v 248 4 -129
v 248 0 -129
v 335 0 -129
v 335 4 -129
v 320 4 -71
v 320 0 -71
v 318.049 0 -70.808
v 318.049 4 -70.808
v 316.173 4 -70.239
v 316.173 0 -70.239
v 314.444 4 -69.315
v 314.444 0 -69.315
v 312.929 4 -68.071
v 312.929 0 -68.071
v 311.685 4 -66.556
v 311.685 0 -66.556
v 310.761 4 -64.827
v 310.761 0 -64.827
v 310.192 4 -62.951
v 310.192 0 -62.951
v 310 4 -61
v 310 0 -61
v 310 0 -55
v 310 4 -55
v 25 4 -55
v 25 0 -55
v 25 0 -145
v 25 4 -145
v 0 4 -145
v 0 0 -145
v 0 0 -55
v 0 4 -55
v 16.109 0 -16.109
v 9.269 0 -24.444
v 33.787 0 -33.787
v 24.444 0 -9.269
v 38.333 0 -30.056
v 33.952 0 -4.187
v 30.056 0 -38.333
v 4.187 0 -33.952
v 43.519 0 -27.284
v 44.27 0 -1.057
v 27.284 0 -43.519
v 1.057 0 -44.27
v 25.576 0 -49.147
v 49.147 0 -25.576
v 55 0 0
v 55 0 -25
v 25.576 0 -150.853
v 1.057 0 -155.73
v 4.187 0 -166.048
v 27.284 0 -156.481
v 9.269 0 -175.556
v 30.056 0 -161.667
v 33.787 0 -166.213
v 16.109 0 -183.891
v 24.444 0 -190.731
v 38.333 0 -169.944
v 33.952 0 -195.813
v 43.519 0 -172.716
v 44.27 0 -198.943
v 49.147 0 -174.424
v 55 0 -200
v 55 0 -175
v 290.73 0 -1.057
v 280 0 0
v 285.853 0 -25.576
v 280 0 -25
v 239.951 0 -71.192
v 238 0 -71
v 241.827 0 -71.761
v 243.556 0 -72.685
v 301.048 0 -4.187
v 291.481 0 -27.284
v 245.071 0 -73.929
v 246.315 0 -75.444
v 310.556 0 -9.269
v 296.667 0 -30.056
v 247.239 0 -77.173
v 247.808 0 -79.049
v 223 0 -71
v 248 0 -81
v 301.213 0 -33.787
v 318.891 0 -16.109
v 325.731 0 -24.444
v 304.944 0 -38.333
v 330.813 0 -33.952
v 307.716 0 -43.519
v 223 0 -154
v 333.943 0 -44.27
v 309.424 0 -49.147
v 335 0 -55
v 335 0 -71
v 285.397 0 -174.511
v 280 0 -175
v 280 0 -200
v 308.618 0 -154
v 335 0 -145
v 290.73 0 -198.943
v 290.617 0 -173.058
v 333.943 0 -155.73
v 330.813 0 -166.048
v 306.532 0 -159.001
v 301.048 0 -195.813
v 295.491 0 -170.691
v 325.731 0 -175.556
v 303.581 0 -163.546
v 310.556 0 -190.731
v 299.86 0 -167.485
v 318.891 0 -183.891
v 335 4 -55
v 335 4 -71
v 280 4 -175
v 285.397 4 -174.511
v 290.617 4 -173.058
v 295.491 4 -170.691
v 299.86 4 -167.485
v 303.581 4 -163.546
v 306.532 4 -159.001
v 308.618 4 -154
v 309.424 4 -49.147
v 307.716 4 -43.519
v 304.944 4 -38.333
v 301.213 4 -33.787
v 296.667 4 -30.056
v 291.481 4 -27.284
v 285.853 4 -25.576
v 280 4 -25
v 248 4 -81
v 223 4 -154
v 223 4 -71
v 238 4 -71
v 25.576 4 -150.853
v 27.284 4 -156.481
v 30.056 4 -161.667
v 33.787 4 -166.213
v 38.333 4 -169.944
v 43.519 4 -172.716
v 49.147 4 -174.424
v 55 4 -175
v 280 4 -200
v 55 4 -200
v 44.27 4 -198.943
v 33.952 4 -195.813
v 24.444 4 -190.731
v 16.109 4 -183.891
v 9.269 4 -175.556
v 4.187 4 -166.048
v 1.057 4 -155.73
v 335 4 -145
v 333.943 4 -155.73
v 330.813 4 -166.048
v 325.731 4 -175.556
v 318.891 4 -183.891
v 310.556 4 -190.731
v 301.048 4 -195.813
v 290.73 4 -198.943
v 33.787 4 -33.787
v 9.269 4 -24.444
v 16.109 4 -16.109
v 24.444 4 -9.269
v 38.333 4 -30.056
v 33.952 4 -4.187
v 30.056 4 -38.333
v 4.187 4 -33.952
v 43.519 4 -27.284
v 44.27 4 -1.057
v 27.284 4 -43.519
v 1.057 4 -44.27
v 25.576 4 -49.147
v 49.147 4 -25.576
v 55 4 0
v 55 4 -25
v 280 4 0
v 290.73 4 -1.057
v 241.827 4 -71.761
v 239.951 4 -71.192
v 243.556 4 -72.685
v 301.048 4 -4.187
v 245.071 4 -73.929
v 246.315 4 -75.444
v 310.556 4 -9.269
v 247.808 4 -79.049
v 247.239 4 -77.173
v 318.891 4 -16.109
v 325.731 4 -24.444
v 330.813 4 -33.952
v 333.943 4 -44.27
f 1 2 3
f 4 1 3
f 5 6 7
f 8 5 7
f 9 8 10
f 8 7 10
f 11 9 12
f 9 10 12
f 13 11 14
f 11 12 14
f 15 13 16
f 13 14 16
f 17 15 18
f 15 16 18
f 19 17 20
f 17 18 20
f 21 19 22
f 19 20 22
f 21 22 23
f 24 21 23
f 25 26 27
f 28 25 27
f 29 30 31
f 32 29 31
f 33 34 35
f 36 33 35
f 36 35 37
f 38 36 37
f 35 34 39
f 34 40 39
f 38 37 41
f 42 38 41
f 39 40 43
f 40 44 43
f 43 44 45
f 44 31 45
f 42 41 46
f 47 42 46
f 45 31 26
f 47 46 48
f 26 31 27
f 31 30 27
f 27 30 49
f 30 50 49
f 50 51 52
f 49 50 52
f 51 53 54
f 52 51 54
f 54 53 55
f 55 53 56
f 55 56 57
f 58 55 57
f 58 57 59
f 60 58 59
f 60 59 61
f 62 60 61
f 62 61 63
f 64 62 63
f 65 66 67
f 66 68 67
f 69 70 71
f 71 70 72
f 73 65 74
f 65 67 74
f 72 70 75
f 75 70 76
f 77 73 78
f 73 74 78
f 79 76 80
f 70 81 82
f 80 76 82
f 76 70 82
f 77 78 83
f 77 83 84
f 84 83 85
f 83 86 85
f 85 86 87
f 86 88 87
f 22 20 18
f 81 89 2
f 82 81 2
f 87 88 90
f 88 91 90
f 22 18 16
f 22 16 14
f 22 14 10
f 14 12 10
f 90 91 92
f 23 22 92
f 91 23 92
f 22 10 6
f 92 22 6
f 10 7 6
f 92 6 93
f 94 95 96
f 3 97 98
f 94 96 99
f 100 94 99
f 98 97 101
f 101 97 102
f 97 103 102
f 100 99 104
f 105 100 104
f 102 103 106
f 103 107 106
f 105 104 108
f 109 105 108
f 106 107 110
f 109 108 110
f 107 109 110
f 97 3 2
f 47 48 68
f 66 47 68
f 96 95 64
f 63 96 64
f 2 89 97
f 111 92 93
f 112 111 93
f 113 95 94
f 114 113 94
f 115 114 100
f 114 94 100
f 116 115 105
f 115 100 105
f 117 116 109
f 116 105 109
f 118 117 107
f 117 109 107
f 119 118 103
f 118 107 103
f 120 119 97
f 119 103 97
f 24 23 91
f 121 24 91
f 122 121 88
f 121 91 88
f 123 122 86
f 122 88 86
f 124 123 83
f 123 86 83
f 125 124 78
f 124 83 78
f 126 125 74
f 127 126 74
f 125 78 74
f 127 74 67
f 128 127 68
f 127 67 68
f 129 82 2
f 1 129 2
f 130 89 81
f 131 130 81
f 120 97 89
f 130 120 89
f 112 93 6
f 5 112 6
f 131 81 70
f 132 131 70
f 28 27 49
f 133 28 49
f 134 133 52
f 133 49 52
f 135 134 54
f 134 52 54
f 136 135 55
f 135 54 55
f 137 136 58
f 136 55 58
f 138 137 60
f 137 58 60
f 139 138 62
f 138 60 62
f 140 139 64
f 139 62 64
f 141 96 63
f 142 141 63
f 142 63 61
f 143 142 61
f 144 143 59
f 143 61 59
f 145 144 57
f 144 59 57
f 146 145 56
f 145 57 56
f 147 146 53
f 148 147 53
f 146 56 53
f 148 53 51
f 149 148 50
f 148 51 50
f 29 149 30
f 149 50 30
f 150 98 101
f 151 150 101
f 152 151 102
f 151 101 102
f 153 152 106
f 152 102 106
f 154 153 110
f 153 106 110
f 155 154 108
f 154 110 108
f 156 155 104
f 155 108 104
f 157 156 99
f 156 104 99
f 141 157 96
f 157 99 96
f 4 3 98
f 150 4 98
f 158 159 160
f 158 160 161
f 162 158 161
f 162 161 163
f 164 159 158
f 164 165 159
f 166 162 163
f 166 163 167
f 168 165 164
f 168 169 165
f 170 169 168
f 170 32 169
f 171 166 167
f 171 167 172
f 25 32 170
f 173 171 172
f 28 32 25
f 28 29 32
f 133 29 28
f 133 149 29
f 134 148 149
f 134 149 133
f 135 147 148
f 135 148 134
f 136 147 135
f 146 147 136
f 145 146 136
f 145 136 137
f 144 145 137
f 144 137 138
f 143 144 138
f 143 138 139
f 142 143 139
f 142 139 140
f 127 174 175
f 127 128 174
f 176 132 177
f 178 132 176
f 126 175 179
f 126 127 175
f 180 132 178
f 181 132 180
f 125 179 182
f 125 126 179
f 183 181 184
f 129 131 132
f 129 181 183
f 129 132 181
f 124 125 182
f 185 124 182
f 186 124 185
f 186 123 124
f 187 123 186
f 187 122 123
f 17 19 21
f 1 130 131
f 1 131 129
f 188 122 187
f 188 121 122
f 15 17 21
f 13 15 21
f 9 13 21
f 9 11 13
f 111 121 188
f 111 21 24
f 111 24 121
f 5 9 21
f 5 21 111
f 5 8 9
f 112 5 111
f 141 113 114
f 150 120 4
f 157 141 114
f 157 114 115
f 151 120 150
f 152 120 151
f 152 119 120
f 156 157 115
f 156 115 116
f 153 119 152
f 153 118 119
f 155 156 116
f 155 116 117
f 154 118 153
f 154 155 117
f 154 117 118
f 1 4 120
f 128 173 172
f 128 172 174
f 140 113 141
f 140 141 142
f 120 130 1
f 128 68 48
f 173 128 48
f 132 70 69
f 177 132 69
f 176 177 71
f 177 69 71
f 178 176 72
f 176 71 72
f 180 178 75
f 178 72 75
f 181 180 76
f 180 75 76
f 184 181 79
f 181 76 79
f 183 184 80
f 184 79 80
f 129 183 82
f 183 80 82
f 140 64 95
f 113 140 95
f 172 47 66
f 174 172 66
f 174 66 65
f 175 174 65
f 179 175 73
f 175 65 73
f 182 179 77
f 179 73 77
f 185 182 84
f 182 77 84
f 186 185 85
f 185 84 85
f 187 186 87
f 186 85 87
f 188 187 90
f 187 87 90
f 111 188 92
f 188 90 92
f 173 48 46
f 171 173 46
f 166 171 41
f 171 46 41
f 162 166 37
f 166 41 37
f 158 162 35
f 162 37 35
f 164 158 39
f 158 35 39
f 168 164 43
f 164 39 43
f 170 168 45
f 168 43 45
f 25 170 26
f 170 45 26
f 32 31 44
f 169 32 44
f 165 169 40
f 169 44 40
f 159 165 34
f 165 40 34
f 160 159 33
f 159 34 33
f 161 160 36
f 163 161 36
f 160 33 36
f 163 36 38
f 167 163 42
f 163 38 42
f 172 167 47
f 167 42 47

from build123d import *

# Parameters (mm, degrees)
BOSS_EXTRUDE1_DEPTH = 4


with BuildPart() as part:
    # Sketch1 → Boss-Extrude1 (new body)
    with BuildSketch(Plane(origin=(0, 0, 0), x_dir=(1, 0, 0), z_dir=(0, 1, 0))):
        with BuildLine():
            Line((223, 154), (223, 71))
            Line((223, 71), (238, 71))
            ThreePointArc((238, 71), (245.071067812, 73.928932188), (248, 81))
            Line((248, 81), (248, 129))
            Line((248, 129), (335, 129))
            Line((335, 129), (335, 145))
            ThreePointArc((335, 145), (318.890872965, 183.890872965), (280, 200))
            Line((280, 200), (55, 200))
            ThreePointArc((55, 200), (16.109127035, 183.890872965), (0, 145))
            Line((0, 145), (0, 55))
            ThreePointArc((0, 55), (16.109127035, 16.109127035), (55, 0))
            Line((55, 0), (280, 0))
            ThreePointArc((280, 0), (318.890872965, 16.109127035), (335, 55))
            Line((335, 55), (335, 71))
            Line((335, 71), (320, 71))
            ThreePointArc((320, 71), (312.928932188, 68.071067812), (310, 61))
            Line((310, 61), (310, 55))
            ThreePointArc((310, 55), (301.213203436, 33.786796564), (280, 25))
            Line((280, 25), (55, 25))
            ThreePointArc((55, 25), (33.786796564, 33.786796564), (25, 55))
            Line((25, 55), (25, 145))
            ThreePointArc((25, 145), (33.786796564, 166.213203436), (55, 175))
            Line((55, 175), (280, 175))
            ThreePointArc((280, 175), (297.748239349, 169.186773245), (308.618176043, 154))
            Line((308.618176043, 154), (223, 154))
        make_face()
    extrude(amount=BOSS_EXTRUDE1_DEPTH)


solid = part.part
